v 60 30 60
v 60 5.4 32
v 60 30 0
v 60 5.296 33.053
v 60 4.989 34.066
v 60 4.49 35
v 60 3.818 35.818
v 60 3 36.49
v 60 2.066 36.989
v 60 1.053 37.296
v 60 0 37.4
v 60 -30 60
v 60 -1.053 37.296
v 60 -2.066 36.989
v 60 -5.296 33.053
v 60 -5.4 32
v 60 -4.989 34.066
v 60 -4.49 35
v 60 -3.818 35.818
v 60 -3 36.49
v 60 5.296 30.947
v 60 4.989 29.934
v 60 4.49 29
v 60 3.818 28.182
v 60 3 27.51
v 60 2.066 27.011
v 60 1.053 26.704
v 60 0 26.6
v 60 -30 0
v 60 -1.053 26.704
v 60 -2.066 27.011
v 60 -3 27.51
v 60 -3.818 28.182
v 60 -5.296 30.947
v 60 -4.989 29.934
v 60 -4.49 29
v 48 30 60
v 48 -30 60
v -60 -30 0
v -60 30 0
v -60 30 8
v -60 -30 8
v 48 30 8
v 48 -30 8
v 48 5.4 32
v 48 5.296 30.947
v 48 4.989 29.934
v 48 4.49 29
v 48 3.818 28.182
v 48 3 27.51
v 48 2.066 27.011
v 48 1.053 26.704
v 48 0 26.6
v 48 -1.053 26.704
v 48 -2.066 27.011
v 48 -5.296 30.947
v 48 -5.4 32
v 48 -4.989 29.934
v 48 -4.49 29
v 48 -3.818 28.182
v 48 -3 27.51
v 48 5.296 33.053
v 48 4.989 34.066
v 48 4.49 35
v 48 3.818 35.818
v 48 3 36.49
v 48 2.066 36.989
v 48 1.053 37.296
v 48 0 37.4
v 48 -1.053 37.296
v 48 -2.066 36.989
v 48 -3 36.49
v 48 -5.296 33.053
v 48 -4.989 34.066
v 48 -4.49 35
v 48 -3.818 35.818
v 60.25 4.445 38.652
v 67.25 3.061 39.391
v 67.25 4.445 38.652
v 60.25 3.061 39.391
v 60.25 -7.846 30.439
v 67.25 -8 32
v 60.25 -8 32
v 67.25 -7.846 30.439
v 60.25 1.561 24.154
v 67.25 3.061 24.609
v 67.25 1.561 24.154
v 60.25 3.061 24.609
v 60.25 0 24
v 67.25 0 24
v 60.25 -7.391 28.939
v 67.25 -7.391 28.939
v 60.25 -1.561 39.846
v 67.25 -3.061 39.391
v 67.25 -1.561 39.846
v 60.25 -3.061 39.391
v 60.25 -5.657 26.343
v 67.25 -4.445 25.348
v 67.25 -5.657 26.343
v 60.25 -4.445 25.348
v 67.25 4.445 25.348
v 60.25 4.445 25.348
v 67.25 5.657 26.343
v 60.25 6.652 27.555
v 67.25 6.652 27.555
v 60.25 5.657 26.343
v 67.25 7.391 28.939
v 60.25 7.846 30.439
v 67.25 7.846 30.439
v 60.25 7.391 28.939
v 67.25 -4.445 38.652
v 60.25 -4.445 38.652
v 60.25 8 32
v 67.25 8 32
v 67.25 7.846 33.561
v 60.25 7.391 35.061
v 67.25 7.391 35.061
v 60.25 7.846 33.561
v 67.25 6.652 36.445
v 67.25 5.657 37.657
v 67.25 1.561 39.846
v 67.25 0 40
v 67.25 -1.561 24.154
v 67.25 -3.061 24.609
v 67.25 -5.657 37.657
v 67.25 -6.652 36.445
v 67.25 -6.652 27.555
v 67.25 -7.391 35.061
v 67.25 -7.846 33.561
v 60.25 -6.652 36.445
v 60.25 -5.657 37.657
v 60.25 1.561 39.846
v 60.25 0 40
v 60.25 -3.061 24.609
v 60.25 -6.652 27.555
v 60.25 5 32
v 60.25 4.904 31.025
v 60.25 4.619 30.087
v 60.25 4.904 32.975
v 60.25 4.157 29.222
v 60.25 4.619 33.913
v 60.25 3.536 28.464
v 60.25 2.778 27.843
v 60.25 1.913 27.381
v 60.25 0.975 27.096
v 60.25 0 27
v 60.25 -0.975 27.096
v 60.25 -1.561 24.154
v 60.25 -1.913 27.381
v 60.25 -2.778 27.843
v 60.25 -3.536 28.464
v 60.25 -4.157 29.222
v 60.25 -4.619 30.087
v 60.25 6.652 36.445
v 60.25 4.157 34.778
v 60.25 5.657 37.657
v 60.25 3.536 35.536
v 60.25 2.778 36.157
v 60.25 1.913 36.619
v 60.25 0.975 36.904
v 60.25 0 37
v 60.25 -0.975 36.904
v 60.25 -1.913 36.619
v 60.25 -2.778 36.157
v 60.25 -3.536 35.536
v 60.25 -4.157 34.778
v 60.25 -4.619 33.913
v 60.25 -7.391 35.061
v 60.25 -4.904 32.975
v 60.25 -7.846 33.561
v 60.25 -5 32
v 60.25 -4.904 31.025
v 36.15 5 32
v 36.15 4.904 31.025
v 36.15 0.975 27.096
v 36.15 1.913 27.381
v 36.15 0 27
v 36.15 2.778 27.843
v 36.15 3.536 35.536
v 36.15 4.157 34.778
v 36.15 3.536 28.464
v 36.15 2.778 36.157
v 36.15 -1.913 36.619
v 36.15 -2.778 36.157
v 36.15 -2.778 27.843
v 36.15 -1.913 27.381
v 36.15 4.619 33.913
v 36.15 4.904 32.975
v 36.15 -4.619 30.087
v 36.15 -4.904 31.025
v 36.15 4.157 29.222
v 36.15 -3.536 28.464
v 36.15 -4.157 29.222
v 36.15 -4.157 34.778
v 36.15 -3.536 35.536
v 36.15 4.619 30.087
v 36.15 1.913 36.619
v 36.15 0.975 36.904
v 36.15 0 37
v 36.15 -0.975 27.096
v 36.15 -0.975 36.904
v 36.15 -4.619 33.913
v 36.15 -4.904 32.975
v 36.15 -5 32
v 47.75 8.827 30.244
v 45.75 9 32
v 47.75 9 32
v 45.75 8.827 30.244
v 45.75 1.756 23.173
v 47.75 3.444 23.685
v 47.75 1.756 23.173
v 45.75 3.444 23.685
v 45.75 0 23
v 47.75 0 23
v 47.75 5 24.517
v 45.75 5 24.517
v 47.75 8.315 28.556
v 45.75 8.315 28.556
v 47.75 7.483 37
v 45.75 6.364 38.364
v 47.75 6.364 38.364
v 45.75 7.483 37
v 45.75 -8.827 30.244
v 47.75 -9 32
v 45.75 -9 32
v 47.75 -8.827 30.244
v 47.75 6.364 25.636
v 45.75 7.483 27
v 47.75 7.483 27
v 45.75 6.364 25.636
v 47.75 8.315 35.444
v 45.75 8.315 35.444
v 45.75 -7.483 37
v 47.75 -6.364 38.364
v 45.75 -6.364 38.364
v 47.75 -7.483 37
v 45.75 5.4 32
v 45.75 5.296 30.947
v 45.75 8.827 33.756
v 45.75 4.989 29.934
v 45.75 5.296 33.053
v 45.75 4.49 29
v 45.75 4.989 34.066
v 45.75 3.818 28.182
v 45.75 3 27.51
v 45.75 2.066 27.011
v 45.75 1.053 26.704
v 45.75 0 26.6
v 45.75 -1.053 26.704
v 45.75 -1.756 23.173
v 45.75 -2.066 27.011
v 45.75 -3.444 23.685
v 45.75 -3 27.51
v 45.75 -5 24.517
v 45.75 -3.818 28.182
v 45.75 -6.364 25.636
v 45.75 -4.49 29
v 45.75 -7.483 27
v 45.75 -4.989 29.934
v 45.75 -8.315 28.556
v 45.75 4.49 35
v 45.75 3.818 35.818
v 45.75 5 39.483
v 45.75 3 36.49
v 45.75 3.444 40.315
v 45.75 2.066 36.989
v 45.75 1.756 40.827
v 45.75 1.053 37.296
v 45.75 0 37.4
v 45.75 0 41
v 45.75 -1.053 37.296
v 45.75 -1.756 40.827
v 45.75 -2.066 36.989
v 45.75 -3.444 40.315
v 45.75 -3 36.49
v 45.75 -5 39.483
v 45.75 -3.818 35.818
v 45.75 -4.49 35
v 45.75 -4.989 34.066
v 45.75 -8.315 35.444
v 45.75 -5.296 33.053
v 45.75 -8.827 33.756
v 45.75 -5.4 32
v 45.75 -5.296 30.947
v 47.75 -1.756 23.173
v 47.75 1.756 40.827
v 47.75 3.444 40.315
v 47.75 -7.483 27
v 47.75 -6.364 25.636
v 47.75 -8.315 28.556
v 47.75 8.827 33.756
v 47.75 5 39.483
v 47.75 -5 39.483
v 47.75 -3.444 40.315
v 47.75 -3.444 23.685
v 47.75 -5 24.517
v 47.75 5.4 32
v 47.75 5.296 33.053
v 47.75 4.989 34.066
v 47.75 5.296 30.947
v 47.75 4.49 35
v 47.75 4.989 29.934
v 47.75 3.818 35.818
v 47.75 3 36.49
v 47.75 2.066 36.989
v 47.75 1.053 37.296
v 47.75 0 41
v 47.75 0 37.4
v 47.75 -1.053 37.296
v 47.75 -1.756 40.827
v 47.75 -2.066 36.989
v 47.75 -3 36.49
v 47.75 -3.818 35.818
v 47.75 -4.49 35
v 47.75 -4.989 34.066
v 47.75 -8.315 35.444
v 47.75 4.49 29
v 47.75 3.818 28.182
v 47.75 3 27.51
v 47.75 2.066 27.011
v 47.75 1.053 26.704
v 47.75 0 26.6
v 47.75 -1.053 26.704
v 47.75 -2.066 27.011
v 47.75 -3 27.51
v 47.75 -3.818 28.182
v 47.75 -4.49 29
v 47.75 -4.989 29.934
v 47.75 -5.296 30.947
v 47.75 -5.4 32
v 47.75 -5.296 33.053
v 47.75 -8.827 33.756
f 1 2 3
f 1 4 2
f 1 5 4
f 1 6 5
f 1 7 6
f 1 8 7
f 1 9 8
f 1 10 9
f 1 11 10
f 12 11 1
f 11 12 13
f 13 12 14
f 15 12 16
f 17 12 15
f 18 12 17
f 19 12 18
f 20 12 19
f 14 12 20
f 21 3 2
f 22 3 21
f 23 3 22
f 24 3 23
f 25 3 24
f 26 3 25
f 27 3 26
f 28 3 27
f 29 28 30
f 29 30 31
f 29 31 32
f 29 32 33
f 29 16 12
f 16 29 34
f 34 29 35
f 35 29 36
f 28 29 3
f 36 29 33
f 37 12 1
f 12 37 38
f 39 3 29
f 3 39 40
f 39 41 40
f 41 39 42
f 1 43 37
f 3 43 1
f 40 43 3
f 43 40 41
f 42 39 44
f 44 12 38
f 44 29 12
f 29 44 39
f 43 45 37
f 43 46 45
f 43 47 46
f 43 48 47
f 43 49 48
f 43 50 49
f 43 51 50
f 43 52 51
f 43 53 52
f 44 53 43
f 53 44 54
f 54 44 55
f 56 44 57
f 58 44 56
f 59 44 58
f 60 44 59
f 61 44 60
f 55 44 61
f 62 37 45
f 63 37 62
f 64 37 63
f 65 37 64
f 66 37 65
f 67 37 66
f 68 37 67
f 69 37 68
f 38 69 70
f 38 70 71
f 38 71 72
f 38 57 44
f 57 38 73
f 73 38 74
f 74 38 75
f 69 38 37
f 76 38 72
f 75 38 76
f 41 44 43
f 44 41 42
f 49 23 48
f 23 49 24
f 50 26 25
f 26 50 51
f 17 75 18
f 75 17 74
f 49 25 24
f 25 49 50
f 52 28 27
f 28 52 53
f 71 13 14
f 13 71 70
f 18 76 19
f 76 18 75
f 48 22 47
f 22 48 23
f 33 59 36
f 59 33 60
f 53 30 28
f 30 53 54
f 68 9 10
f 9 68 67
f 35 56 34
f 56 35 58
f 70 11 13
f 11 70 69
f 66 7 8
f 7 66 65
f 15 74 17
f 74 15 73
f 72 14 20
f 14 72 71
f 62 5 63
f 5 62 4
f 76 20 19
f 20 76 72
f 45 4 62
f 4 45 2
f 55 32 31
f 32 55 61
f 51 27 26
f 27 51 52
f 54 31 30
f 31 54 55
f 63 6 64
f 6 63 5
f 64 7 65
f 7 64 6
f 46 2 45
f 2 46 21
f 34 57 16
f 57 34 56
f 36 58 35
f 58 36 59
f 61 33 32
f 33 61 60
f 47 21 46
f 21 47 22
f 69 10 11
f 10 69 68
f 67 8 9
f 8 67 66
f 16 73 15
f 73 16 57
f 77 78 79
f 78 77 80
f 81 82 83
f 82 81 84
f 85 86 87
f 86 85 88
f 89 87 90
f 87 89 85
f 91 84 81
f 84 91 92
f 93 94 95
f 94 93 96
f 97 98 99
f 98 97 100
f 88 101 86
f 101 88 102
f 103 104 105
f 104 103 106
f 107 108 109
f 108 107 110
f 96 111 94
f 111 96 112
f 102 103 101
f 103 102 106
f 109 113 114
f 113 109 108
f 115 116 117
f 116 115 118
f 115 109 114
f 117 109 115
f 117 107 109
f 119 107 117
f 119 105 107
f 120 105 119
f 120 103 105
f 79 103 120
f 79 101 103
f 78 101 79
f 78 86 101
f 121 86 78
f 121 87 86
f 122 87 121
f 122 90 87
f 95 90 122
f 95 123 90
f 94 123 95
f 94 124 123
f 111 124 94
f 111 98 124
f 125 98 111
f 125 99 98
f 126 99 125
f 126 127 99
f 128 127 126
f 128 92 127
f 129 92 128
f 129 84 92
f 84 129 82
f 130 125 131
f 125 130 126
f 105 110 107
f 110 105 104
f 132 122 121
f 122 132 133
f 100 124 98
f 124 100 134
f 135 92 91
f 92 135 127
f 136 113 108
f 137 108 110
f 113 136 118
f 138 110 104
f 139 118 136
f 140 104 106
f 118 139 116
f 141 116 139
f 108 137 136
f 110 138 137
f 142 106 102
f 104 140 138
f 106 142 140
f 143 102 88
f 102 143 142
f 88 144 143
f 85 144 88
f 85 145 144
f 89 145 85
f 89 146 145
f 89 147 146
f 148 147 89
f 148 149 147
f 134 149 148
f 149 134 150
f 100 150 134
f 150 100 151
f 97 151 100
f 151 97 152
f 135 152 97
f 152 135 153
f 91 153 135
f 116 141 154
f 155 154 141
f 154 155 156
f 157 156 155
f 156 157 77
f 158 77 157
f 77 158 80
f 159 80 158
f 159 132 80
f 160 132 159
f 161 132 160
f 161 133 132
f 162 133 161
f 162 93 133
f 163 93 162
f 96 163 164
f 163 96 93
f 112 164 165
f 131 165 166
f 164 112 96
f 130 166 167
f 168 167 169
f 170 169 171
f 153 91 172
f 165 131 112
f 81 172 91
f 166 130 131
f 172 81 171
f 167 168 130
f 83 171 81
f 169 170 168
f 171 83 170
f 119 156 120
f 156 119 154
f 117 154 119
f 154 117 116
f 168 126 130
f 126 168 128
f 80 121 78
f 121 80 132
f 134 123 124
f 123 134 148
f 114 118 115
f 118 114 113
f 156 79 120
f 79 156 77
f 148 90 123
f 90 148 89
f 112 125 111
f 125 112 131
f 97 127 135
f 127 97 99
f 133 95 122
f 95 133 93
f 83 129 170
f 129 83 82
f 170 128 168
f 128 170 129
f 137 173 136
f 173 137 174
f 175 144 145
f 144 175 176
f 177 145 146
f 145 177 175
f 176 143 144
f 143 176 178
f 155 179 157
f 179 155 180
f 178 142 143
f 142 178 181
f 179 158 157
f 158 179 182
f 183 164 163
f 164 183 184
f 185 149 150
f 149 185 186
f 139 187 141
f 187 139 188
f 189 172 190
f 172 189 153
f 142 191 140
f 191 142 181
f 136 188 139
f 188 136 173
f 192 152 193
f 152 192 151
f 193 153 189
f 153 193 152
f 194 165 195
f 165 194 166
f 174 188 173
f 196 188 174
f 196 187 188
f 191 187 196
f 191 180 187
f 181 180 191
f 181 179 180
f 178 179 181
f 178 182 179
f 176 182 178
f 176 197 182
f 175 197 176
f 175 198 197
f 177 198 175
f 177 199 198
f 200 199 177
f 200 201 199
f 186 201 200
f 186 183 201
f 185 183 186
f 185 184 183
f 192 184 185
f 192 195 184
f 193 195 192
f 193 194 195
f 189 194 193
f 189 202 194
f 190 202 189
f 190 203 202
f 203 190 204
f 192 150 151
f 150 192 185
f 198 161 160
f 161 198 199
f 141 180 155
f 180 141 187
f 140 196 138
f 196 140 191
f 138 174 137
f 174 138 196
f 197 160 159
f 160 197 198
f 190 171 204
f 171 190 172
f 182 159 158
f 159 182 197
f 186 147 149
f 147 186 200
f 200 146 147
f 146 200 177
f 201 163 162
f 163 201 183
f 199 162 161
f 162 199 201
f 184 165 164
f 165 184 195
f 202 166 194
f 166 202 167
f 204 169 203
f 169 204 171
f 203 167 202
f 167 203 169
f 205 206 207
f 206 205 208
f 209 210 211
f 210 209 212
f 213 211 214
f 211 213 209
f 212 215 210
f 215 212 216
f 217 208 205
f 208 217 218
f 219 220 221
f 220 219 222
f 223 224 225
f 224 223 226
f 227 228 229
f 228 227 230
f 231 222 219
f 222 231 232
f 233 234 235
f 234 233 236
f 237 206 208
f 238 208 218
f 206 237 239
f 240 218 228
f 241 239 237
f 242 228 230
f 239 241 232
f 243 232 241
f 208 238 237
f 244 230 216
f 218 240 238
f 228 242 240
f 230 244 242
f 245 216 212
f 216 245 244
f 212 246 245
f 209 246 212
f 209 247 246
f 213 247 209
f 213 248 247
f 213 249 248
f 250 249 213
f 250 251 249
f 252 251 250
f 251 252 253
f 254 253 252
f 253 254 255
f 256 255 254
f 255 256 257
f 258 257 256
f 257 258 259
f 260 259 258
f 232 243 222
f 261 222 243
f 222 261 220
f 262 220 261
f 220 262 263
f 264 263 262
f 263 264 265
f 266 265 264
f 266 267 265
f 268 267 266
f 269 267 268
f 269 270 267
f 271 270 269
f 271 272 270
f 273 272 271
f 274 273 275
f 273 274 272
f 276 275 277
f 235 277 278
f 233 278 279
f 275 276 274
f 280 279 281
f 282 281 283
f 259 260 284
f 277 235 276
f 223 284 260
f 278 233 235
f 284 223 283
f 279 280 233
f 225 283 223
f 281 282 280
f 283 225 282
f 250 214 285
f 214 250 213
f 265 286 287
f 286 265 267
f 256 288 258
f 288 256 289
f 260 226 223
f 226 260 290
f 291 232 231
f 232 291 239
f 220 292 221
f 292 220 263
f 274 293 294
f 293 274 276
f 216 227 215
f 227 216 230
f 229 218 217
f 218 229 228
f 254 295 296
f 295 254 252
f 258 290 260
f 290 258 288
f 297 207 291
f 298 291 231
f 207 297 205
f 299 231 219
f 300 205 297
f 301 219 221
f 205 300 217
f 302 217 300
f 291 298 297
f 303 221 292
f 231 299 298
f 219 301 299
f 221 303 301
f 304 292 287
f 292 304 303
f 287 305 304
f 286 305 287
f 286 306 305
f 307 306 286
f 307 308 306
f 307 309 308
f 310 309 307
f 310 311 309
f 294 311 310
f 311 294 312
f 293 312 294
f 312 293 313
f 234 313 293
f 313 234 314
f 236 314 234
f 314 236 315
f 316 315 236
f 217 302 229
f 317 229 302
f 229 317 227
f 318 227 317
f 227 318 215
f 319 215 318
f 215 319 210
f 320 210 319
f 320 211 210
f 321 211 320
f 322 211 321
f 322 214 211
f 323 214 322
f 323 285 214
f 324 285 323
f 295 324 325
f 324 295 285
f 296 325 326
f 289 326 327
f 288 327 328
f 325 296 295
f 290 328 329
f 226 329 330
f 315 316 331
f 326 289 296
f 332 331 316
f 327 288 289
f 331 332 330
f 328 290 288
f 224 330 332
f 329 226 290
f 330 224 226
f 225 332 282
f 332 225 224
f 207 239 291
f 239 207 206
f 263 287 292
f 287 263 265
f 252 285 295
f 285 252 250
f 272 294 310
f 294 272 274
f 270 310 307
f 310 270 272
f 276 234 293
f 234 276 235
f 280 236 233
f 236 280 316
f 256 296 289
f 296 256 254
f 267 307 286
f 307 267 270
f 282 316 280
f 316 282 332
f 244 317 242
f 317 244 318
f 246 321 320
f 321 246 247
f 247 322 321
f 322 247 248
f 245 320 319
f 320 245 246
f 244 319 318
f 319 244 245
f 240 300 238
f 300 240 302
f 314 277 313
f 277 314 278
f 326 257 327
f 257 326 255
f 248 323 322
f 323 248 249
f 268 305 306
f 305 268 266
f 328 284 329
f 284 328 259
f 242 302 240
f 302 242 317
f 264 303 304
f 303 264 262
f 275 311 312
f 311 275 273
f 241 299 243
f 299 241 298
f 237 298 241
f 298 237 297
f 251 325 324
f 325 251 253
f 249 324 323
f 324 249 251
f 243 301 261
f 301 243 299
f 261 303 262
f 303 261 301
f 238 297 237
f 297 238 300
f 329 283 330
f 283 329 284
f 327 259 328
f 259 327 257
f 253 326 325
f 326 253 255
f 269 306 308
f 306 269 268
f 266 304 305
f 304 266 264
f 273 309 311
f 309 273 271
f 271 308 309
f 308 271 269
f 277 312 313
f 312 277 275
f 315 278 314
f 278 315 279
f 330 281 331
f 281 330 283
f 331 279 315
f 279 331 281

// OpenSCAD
$fn = 32;

// ------------------------------------------------------------------------
// Bolted bracket: 120 x 60 mm bracket with 1 bolt joints
// Every part is its own module, assembly() places them once.
// ------------------------------------------------------------------------

// --- part 1 ---
module bracket() {
  difference() {
    translate([-60, -30, 0]) cube([120, 60, 60]);
    translate([-61, -31, 8]) cube([109, 62, 53]);
    translate([54, 0, 32]) rotate([0, 90, 0]) cylinder(h = 14, d = 10.8, center = true);
  }
}

// --- part 2 ---
module bolt() {
  cylinder(h = 7, d = 16);
  translate([0, 0, -24.1]) cylinder(h = 24.1, d = 10);
}

// --- part 3 ---
module washer() {
  difference() {
      translate([0, 0, 0]) cylinder(h = 2, d = 18);
      translate([0, 0, -1]) cylinder(h = 4, d = 10.8);
    }
}

// --- assembly ---
module assembly() {
  translate([0, 0, 0]) rotate([0, 0, 0]) bracket();
  translate([60.25, 0, 32]) rotate([0, 90, 0]) bolt();
  translate([45.75, 0, 32]) rotate([0, 90, 0]) washer();
}

assembly();
